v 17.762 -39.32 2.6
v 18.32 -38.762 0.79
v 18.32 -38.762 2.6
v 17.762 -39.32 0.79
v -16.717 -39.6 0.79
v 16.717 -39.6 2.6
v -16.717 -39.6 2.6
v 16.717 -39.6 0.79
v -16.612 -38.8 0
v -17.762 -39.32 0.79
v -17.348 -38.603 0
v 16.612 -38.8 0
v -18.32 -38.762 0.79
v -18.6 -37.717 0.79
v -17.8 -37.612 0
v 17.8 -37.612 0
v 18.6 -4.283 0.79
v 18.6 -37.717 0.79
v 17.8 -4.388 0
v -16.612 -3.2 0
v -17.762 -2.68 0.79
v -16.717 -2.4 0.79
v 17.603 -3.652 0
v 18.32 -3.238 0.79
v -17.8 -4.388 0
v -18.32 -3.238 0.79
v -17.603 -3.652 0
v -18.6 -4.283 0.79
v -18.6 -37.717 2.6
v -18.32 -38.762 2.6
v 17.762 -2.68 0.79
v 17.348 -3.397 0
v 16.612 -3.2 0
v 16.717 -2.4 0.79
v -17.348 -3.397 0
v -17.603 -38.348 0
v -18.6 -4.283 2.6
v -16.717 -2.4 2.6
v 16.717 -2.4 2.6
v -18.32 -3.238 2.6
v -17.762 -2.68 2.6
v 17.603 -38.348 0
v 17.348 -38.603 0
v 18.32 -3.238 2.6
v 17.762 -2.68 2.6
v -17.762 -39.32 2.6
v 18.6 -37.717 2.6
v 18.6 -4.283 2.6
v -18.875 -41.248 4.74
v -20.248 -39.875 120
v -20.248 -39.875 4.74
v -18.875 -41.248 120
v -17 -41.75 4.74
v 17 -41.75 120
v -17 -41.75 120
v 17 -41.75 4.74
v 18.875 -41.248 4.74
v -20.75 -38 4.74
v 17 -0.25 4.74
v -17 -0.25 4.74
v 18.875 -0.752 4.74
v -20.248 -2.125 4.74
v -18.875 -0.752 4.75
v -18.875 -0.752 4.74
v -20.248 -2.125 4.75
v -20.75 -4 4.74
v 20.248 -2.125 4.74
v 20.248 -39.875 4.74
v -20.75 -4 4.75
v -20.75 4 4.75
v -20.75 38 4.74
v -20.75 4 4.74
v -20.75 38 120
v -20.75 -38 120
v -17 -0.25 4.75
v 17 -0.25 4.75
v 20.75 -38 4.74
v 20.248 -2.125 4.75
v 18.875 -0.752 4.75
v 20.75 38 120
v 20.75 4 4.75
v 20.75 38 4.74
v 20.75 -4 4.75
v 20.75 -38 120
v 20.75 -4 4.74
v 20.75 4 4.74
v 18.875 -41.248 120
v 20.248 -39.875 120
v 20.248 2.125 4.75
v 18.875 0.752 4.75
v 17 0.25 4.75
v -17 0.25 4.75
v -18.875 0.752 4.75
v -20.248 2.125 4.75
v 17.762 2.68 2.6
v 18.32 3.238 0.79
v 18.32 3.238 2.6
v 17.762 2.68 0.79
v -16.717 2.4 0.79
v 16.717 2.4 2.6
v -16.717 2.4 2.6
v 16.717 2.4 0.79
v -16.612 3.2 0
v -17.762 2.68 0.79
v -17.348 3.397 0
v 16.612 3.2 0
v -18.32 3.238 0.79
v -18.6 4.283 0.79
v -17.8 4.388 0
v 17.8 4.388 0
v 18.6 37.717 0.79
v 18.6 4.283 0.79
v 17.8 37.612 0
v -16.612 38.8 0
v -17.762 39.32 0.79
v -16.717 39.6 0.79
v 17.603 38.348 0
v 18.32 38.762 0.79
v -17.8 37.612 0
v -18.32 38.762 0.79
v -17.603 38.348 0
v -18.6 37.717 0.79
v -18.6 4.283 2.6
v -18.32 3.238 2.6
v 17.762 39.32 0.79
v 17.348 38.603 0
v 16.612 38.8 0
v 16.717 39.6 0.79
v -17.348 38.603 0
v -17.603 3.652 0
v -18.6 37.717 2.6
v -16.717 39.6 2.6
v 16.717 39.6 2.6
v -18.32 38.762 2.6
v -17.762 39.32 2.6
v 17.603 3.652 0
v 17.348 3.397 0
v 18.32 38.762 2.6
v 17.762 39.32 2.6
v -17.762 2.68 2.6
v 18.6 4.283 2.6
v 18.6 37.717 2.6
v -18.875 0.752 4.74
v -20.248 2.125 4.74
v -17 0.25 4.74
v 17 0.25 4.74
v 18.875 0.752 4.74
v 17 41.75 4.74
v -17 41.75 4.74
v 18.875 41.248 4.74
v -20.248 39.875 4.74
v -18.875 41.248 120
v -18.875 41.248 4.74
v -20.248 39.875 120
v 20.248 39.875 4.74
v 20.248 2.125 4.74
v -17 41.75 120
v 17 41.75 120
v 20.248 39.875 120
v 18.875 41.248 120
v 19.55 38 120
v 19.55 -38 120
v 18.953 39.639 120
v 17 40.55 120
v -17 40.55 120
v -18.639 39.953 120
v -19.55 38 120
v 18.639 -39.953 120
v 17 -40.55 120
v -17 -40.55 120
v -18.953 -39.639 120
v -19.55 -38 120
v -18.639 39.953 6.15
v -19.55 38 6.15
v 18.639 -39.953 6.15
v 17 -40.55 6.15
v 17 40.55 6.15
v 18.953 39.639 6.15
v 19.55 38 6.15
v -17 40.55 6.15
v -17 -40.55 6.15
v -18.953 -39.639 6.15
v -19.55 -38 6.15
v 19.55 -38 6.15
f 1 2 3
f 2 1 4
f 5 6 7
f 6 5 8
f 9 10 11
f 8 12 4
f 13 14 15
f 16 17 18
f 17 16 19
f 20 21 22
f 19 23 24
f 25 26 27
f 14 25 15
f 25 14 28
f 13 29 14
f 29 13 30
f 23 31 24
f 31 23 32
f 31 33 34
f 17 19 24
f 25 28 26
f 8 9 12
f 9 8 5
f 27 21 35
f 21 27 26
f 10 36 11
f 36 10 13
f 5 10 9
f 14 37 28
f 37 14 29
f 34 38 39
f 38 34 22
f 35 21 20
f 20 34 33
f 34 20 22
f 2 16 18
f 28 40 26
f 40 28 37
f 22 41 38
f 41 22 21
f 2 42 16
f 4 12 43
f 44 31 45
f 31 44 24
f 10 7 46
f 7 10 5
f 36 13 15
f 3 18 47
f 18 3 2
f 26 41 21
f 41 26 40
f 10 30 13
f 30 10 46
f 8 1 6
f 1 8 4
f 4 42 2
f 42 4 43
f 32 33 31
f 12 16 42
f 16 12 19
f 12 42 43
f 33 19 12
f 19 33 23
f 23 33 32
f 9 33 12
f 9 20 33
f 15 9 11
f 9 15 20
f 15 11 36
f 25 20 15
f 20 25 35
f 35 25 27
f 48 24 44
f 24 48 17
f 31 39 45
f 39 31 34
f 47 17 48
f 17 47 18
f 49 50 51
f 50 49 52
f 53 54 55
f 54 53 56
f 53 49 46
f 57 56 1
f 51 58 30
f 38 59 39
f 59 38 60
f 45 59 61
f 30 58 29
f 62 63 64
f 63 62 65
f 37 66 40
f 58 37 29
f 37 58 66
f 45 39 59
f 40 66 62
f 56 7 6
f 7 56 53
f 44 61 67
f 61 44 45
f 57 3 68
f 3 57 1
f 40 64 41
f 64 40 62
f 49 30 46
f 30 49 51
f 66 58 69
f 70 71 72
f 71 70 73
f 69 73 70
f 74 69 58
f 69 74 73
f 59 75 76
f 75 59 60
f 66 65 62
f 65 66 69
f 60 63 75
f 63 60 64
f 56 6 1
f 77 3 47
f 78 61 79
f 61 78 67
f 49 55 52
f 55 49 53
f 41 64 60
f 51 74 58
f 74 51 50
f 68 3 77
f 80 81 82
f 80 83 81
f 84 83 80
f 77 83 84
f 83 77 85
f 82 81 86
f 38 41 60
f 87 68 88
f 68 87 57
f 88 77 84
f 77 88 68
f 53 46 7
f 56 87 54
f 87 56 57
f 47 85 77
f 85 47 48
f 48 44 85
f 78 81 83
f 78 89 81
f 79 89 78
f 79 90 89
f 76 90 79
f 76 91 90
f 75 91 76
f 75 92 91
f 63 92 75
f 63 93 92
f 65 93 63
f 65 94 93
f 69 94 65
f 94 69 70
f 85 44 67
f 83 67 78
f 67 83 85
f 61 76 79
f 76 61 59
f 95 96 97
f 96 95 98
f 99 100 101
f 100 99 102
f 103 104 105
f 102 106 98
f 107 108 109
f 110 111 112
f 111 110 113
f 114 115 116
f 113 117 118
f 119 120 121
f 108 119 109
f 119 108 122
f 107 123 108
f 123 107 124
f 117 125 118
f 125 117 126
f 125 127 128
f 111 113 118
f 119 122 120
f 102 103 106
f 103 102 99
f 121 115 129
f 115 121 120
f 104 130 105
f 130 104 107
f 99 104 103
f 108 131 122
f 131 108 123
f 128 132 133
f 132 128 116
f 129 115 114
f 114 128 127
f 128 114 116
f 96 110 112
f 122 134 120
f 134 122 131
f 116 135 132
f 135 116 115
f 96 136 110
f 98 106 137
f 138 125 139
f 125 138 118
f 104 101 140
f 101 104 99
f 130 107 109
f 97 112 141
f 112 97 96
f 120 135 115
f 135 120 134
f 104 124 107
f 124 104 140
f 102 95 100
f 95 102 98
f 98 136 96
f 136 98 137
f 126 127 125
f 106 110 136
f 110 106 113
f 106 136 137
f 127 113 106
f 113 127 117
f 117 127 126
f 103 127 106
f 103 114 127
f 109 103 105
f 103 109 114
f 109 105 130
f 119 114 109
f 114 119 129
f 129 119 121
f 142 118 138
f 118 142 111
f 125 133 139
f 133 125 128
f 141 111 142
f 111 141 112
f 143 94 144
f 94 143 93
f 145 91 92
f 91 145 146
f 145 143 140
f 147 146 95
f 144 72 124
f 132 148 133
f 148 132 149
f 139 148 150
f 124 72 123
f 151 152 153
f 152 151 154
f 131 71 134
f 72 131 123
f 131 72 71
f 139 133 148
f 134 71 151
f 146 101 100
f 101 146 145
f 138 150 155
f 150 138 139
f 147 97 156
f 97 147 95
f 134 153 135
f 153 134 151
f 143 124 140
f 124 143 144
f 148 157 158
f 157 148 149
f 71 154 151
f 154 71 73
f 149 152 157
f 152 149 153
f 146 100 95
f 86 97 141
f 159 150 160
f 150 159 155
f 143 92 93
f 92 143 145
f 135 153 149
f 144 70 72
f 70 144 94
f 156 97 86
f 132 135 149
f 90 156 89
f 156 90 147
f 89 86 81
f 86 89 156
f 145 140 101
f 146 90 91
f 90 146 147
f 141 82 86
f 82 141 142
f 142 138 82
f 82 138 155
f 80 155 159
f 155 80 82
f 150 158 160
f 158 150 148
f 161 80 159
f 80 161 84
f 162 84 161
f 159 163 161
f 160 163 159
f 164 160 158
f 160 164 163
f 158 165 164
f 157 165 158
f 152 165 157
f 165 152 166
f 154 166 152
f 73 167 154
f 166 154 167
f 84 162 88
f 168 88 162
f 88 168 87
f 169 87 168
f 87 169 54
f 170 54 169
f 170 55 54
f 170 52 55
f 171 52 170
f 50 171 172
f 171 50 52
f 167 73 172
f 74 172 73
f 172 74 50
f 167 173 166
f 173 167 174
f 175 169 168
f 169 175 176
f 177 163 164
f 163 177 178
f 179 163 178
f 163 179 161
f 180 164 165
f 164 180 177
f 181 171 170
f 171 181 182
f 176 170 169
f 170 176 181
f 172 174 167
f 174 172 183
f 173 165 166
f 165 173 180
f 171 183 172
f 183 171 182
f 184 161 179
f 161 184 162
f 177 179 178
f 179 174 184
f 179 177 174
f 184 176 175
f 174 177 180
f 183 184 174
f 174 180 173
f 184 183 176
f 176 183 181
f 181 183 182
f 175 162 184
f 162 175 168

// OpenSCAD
// file: ../lib/gridfinity.scad
// gridfinity.scad — shared Gridfinity baseplate + bin library (per spec).
//
// 42 mm pitch, 41.5 mm bins, baseplate socket 0.7/1.8/2.15 = 4.65 mm, 4 mm
// fillet; bin foot 0.8/1.8/2.15 = 4.75 mm, 3.75 mm corner radius. Verified the
// bin foot seats in the baseplate socket with ~0.25–0.5 mm clearance.
//
//   baseplate(nx, ny)                      — tiled receiving baseplate
//   bin(nx, ny, h, wall, floor)            — open Gridfinity bin
//   divided_bin(nx, ny, h, cols, rows, …)  — bin with internal compartments

GF = 42; GF_FILLET = 4;
_C_TOP = 2.15; _C_MID = 1.8; _C_BOT = 0.7;
_BP_LIP = _C_TOP + _C_MID + _C_BOT; _BP_FLOOR = 1.2; BP_H = _BP_LIP + _BP_FLOOR;  // 5.85
BIN_SZ = 41.5; BIN_R = 3.75; BIN_BASE_H = 4.75;

// ---- baseplate ----
module _bp_cell(i = 0) { offset(r = -i) offset(r = GF_FILLET) offset(r = -GF_FILLET) square(GF, center = true); }
module _bp_socket() {
    e = 0.01;
    hull() { translate([0,0,BP_H-e]) linear_extrude(e) _bp_cell(0); translate([0,0,BP_H-_C_TOP]) linear_extrude(e) _bp_cell(_C_TOP); }
    translate([0,0,BP_H-_C_TOP-_C_MID]) linear_extrude(_C_MID) _bp_cell(_C_TOP);
    hull() { translate([0,0,BP_H-_C_TOP-_C_MID-e]) linear_extrude(e) _bp_cell(_C_TOP); translate([0,0,BP_H-_BP_LIP]) linear_extrude(e) _bp_cell(_C_TOP+_C_BOT); }
}
module baseplate(nx, ny) {
    w = nx*GF; d = ny*GF;
    difference() {
        translate([0,0,BP_H/2]) linear_extrude(BP_H, center=true) offset(GF_FILLET) offset(-GF_FILLET) square([w,d], center=true);
        for (ix=[0:nx-1], iy=[0:ny-1]) translate([(ix-(nx-1)/2)*GF, (iy-(ny-1)/2)*GF, 0]) _bp_socket();
    }
}

// ---- bin ----
module _bin_cell(i = 0) { offset(r = -i) offset(r = BIN_R) offset(r = -BIN_R) square(BIN_SZ, center = true); }
module _bin_foot() {
    e = 0.01;
    hull() { linear_extrude(e) _bin_cell(2.95); translate([0,0,0.8]) linear_extrude(e) _bin_cell(2.15); }    // bottom chamfer
    translate([0,0,0.8]) linear_extrude(1.8) _bin_cell(2.15);                                                 // vertical
    hull() { translate([0,0,2.6]) linear_extrude(e) _bin_cell(2.15); translate([0,0,BIN_BASE_H]) linear_extrude(e) _bin_cell(0); } // top chamfer
}
module _bin_shell(nx, ny, h, wall, floor) {
    W = nx*GF - 0.5; D = ny*GF - 0.5;
    difference() {
        union() {
            for (ix=[0:nx-1], iy=[0:ny-1]) translate([(ix-(nx-1)/2)*GF, (iy-(ny-1)/2)*GF, 0]) _bin_foot();
            translate([0,0,BIN_BASE_H]) linear_extrude(h-BIN_BASE_H) offset(BIN_R) offset(-BIN_R) square([W,D], center=true);
        }
        translate([0,0,BIN_BASE_H+floor]) linear_extrude(h) offset(BIN_R-wall) offset(-(BIN_R-wall)) square([W-2*wall, D-2*wall], center=true);
    }
}
module bin(nx, ny, h, wall = 1.2, floor = 1.4) { _bin_shell(nx, ny, h, wall, floor); }

module divided_bin(nx, ny, h, cols = 1, rows = 1, wall = 1.2, floor = 1.4, div = 1.2) {
    W = nx*GF - 0.5; D = ny*GF - 0.5;
    union() {
        bin(nx, ny, h, wall, floor);
        // internal divider walls (from the floor up to the rim)
        iw = W - 2*wall; id = D - 2*wall; z0 = BIN_BASE_H + floor;
        for (c = [1 : cols-1]) translate([-iw/2 + c*iw/cols - div/2, -id/2, z0]) cube([div, id, h - z0]);
        for (r = [1 : rows-1]) translate([-iw/2, -id/2 + r*id/rows - div/2, z0]) cube([iw, div, h - z0]);
    }
}
// file: apache_organizer_common.scad
// apache_organizer_common.scad — shared bits for the Apache 5800 cord organizer.
//
// Case interior: 514 × 289 × 144 mm. The floor is a 12 × 6 Gridfinity grid
// (504 × 252) printed as two 6 × 6 tiles; the ~37 mm spare on one long side is
// a cable channel, ~5 mm border at each end. Tiles butt and the case walls hold
// them; 2 alignment pegs per mating edge keep them flush and slide-together.

include <../lib/gridfinity.scad>

TILE_NX = 6; TILE_NY = 6;       // each tile (252 × 252)
PEG_D = 3.5; PEG_L = 6; PEG_Y = 60;

// Tile with alignment pegs on +X edge and matching holes on -X edge, so two
// identical tiles chain along the case length.
module organizer_tile() {
    w = TILE_NX * GF;            // 252
    difference() {
        union() {
            baseplate(TILE_NX, TILE_NY);
            for (y = [PEG_Y, -PEG_Y]) translate([w/2, y, BP_H/2]) rotate([0,90,0]) cylinder(d = PEG_D, h = PEG_L); // +X pegs
        }
        for (y = [PEG_Y, -PEG_Y]) translate([-w/2 - 0.1, y, BP_H/2]) rotate([0,90,0]) cylinder(d = PEG_D + 0.4, h = PEG_L + 1); // -X holes
    }
}
// main file
// bin_bundle — tall narrow 1×2 bin to stand a coiled bundle upright.
include <apache_organizer_common.scad>
bin(1, 2, 120);
